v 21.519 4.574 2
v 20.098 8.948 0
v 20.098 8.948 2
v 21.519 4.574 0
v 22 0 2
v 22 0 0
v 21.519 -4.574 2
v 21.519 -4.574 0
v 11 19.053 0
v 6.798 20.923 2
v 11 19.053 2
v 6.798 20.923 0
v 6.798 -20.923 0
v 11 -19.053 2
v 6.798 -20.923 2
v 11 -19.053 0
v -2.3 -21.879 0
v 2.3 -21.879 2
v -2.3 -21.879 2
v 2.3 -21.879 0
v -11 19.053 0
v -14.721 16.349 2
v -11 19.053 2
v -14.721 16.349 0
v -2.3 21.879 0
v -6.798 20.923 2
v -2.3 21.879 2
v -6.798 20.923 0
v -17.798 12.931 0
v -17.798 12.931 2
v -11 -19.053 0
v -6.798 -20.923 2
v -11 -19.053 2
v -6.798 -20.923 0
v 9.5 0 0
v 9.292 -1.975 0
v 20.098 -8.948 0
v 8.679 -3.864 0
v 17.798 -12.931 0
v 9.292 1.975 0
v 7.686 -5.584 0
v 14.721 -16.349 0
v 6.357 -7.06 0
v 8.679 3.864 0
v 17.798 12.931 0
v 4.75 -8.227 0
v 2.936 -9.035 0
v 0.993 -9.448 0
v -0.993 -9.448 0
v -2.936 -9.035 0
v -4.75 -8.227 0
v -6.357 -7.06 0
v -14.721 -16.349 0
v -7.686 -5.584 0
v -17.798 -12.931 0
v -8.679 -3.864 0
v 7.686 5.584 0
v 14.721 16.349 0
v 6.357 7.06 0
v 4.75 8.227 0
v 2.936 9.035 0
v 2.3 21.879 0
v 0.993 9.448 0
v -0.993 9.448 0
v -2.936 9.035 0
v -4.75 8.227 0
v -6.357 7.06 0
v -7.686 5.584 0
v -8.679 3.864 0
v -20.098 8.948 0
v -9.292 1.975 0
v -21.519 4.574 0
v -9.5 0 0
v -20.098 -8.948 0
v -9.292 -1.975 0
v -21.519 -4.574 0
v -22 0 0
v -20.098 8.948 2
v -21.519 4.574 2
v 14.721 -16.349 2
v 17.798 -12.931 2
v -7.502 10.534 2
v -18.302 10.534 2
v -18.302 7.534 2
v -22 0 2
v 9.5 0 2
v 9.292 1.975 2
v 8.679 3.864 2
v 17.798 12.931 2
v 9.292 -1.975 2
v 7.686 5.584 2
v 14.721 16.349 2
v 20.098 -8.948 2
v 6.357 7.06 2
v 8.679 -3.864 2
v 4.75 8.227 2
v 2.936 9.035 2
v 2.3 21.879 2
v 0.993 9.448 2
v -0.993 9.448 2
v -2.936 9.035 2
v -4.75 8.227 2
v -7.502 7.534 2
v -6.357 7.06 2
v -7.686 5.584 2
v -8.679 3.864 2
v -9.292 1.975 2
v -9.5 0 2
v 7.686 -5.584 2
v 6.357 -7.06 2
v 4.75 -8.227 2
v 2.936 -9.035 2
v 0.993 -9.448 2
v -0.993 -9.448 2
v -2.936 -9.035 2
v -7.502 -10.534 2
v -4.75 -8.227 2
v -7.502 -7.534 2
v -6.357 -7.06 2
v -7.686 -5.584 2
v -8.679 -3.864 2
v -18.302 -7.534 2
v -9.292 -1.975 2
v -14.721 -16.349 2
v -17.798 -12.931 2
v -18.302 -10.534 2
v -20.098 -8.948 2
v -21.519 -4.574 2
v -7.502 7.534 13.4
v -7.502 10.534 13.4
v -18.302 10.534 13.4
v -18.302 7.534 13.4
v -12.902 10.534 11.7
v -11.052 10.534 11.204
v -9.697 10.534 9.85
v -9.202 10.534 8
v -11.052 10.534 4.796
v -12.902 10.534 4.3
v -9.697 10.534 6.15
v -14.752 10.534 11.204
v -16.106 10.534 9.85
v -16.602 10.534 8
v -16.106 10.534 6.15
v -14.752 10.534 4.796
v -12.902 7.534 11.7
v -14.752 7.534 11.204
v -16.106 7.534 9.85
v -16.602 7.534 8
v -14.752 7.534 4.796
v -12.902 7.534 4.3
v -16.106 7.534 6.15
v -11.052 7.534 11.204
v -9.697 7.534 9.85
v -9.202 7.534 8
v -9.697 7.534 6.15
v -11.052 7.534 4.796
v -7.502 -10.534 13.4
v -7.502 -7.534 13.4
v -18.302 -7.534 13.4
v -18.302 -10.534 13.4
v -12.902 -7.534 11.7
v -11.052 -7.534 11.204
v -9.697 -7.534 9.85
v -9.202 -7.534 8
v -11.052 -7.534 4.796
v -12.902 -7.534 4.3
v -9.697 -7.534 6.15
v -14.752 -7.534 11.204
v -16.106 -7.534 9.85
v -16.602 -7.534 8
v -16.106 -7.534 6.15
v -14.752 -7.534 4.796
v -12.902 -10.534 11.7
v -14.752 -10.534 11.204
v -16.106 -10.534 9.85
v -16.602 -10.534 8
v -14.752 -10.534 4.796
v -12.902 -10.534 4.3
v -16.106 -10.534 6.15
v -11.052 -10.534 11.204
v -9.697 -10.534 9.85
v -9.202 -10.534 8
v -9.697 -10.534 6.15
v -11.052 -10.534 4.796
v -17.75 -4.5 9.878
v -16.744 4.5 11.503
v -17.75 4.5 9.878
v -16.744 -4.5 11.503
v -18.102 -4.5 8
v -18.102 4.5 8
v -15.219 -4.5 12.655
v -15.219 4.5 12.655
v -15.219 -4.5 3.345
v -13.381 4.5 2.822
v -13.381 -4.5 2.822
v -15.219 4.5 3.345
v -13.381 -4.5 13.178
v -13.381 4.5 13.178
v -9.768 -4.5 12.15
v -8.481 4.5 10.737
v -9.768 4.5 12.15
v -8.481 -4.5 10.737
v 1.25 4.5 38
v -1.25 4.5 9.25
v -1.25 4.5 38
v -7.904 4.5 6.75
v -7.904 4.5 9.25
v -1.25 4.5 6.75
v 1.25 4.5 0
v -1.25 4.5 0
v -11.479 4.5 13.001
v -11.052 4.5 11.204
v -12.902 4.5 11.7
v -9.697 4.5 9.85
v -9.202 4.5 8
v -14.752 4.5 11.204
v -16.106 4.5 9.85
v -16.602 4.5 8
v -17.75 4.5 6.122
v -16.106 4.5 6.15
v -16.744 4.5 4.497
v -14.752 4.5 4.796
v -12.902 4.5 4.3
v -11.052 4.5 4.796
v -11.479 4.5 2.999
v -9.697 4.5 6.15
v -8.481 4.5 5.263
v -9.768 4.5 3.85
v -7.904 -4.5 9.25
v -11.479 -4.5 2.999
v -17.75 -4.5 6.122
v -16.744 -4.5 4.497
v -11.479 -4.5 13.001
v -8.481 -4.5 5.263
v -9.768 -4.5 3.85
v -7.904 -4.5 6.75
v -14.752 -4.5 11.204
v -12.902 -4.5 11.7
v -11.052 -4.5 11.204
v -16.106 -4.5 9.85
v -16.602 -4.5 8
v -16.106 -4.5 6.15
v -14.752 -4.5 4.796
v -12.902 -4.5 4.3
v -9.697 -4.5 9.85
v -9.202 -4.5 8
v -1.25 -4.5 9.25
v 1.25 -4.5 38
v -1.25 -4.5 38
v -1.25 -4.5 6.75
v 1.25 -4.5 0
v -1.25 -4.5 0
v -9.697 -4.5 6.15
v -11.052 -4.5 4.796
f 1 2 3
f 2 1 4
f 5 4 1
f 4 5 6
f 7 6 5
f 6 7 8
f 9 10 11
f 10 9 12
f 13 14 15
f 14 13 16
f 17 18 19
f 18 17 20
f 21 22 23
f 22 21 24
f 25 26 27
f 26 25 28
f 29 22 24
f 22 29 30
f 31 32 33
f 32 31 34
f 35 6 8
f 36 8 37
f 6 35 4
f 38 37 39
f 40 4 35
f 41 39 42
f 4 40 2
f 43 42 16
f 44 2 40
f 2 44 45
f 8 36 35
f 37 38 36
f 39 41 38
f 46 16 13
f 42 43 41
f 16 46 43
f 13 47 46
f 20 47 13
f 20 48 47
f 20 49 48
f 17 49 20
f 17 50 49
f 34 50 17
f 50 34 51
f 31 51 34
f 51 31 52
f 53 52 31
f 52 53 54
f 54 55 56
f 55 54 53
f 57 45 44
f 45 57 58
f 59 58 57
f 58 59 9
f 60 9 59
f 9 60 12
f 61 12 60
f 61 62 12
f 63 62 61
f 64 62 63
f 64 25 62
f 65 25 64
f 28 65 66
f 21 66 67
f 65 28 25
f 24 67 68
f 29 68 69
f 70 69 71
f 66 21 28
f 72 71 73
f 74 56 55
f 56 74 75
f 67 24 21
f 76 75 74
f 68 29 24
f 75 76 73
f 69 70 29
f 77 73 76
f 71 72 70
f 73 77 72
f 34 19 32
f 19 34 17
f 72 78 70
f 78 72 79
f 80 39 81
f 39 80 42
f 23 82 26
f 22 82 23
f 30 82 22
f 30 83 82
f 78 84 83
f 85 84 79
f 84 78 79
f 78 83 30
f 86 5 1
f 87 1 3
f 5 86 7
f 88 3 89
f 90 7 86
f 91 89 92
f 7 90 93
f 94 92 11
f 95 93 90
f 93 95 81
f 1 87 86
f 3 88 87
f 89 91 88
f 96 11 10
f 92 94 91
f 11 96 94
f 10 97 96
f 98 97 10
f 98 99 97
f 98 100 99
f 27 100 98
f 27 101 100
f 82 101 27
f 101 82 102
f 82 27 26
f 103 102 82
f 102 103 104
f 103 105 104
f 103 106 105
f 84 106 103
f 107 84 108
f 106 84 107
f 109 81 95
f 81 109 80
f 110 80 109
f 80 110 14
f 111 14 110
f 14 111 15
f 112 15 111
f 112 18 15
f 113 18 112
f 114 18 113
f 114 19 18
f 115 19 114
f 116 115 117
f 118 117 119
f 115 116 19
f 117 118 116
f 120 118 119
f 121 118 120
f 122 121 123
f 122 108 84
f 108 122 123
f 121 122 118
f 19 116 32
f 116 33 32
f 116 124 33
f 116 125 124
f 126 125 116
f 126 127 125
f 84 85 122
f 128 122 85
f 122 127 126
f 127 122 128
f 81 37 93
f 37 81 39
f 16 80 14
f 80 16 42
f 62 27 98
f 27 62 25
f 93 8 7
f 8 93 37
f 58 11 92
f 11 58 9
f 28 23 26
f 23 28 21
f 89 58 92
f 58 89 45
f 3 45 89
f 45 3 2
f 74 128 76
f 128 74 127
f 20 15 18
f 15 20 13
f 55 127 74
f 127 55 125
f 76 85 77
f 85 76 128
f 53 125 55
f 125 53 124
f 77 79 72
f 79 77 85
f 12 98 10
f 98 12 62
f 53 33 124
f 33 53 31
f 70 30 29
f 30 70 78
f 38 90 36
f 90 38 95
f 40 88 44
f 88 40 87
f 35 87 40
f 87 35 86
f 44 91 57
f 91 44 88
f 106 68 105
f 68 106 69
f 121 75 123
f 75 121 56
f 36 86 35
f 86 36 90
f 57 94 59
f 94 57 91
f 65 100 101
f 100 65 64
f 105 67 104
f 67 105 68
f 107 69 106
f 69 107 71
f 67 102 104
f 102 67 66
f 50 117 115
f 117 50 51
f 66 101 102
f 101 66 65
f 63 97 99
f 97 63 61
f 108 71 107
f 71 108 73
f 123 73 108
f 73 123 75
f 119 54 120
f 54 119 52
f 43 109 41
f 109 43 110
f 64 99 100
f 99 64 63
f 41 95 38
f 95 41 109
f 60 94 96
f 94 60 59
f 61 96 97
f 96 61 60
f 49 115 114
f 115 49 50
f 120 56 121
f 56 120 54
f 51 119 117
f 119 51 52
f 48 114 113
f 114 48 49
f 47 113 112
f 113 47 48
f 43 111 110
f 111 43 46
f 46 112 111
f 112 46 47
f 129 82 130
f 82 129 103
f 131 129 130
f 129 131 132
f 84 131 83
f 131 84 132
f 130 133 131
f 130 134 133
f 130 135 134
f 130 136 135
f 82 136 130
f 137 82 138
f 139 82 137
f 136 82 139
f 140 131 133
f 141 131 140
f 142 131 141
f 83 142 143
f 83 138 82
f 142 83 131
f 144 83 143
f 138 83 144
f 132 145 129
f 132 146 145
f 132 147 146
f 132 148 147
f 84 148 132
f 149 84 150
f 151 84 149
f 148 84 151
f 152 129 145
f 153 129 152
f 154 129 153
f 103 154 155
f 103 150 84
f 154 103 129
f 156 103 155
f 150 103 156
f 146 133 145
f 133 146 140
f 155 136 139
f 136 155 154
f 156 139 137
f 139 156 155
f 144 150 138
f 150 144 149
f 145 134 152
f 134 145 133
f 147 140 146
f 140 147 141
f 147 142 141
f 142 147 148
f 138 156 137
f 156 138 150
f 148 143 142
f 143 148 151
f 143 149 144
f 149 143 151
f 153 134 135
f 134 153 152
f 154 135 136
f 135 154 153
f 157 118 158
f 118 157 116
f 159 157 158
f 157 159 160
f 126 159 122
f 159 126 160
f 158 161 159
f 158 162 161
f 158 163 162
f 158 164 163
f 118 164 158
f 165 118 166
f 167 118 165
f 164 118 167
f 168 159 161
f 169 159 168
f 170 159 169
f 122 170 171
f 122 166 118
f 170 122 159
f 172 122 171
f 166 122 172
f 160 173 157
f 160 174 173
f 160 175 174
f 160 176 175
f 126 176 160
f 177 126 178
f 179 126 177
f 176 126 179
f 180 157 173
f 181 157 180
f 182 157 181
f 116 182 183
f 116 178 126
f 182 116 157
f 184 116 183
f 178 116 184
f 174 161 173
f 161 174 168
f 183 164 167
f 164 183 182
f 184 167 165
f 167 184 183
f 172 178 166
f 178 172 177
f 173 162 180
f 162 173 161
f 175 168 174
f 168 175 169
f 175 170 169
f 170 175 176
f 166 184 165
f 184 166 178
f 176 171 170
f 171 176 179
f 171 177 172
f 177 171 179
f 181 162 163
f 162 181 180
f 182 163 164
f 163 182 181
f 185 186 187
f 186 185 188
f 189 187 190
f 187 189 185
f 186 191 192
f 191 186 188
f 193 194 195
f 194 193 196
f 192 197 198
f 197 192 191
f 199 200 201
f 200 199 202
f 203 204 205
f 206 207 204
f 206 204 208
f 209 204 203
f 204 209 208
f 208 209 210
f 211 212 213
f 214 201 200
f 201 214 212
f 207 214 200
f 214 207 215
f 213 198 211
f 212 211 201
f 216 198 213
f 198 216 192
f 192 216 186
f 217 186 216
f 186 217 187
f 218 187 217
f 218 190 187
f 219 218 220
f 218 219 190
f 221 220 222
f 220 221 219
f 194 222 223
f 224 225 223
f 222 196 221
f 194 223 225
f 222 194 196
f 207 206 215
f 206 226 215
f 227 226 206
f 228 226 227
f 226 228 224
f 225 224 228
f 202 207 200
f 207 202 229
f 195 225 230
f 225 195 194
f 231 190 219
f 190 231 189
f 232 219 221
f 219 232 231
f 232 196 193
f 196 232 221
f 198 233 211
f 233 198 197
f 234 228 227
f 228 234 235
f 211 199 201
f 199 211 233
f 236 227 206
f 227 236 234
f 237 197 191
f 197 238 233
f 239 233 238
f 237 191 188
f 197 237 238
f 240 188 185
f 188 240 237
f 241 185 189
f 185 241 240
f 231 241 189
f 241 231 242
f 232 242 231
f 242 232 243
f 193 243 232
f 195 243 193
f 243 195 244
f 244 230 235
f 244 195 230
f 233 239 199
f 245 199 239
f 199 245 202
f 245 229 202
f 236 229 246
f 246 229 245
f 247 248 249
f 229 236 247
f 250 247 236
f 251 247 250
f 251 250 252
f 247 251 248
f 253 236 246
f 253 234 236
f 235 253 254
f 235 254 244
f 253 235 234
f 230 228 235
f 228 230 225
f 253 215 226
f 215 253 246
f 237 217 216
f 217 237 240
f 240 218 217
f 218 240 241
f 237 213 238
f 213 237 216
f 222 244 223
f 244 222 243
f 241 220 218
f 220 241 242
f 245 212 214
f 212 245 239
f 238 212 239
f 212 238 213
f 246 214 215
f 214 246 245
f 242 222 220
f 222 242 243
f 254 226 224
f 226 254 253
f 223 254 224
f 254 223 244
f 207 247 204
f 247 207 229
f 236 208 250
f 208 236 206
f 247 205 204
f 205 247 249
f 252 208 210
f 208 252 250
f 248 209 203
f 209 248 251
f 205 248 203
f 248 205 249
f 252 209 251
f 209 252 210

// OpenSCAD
// total radius (max is 3.5)
tot_rad = 22;
// inner radius (at least 1.5)
inner_rad = 15 / 2 + 2;
// half way radius
half_rad = (tot_rad + inner_rad) / 2;
// height
height = 2;
epsilon = 0.2;
angle = 35;

//  dowell and or toothpick radius
bar_rad = 3.7;

// how far the dowell center is from surface
protrude = 8;

// lever print height (width?)
print_height = 9;


module truss(){
    padding = 1.7;
    t_height = protrude + bar_rad + padding;
    width = (bar_rad + padding) * 2;
    depth = 3;
    translate([- width  / 2, - depth / 2, 0]) difference(){
            cube([width, depth, t_height]);  
            translate([ width / 2, 
                            - epsilon , 
                            t_height - bar_rad - padding]) {
                rotate([-90, 0, 0]) cylinder(r=bar_rad, h=width + 2 * epsilon, center=false);
        }
    }
}

module base(){
    difference(){
        cylinder(r=tot_rad, h=height);
        translate([0, 0, -epsilon]) cylinder(r=inner_rad, h=height + 2 * epsilon);
    }
    adj = cos(angle) * half_rad;
    opp = sin(angle) * half_rad;
    translate([-adj, opp, 0]) truss();
    translate([-adj, -opp, 0]) truss();
}


module lever(){
    // x is  support <-> button
    // y is lever(age)
    // z is sturdiness / final print heigt
    thickness = 2.5;
    adj = cos(angle) * half_rad;

    translate([0, protrude - thickness / 2, 0]) cube([adj - bar_rad - epsilon, thickness, print_height]);
    translate([-thickness / 2, 0,0]) cube([thickness, 38, print_height]);
    translate([adj, protrude, 0]) difference(){ 
        cylinder(r= bar_rad + 1.5, h=print_height);
        translate([0,0,-epsilon]) cylinder(r = bar_rad, h=print_height + 2 * epsilon);
       
    }
    
    
    }


base();
    // this is a test position, as it will be used, not printed.
    translate([0, -print_height / 2, 0]) rotate([90,0,180]) lever();
//lever(); 
